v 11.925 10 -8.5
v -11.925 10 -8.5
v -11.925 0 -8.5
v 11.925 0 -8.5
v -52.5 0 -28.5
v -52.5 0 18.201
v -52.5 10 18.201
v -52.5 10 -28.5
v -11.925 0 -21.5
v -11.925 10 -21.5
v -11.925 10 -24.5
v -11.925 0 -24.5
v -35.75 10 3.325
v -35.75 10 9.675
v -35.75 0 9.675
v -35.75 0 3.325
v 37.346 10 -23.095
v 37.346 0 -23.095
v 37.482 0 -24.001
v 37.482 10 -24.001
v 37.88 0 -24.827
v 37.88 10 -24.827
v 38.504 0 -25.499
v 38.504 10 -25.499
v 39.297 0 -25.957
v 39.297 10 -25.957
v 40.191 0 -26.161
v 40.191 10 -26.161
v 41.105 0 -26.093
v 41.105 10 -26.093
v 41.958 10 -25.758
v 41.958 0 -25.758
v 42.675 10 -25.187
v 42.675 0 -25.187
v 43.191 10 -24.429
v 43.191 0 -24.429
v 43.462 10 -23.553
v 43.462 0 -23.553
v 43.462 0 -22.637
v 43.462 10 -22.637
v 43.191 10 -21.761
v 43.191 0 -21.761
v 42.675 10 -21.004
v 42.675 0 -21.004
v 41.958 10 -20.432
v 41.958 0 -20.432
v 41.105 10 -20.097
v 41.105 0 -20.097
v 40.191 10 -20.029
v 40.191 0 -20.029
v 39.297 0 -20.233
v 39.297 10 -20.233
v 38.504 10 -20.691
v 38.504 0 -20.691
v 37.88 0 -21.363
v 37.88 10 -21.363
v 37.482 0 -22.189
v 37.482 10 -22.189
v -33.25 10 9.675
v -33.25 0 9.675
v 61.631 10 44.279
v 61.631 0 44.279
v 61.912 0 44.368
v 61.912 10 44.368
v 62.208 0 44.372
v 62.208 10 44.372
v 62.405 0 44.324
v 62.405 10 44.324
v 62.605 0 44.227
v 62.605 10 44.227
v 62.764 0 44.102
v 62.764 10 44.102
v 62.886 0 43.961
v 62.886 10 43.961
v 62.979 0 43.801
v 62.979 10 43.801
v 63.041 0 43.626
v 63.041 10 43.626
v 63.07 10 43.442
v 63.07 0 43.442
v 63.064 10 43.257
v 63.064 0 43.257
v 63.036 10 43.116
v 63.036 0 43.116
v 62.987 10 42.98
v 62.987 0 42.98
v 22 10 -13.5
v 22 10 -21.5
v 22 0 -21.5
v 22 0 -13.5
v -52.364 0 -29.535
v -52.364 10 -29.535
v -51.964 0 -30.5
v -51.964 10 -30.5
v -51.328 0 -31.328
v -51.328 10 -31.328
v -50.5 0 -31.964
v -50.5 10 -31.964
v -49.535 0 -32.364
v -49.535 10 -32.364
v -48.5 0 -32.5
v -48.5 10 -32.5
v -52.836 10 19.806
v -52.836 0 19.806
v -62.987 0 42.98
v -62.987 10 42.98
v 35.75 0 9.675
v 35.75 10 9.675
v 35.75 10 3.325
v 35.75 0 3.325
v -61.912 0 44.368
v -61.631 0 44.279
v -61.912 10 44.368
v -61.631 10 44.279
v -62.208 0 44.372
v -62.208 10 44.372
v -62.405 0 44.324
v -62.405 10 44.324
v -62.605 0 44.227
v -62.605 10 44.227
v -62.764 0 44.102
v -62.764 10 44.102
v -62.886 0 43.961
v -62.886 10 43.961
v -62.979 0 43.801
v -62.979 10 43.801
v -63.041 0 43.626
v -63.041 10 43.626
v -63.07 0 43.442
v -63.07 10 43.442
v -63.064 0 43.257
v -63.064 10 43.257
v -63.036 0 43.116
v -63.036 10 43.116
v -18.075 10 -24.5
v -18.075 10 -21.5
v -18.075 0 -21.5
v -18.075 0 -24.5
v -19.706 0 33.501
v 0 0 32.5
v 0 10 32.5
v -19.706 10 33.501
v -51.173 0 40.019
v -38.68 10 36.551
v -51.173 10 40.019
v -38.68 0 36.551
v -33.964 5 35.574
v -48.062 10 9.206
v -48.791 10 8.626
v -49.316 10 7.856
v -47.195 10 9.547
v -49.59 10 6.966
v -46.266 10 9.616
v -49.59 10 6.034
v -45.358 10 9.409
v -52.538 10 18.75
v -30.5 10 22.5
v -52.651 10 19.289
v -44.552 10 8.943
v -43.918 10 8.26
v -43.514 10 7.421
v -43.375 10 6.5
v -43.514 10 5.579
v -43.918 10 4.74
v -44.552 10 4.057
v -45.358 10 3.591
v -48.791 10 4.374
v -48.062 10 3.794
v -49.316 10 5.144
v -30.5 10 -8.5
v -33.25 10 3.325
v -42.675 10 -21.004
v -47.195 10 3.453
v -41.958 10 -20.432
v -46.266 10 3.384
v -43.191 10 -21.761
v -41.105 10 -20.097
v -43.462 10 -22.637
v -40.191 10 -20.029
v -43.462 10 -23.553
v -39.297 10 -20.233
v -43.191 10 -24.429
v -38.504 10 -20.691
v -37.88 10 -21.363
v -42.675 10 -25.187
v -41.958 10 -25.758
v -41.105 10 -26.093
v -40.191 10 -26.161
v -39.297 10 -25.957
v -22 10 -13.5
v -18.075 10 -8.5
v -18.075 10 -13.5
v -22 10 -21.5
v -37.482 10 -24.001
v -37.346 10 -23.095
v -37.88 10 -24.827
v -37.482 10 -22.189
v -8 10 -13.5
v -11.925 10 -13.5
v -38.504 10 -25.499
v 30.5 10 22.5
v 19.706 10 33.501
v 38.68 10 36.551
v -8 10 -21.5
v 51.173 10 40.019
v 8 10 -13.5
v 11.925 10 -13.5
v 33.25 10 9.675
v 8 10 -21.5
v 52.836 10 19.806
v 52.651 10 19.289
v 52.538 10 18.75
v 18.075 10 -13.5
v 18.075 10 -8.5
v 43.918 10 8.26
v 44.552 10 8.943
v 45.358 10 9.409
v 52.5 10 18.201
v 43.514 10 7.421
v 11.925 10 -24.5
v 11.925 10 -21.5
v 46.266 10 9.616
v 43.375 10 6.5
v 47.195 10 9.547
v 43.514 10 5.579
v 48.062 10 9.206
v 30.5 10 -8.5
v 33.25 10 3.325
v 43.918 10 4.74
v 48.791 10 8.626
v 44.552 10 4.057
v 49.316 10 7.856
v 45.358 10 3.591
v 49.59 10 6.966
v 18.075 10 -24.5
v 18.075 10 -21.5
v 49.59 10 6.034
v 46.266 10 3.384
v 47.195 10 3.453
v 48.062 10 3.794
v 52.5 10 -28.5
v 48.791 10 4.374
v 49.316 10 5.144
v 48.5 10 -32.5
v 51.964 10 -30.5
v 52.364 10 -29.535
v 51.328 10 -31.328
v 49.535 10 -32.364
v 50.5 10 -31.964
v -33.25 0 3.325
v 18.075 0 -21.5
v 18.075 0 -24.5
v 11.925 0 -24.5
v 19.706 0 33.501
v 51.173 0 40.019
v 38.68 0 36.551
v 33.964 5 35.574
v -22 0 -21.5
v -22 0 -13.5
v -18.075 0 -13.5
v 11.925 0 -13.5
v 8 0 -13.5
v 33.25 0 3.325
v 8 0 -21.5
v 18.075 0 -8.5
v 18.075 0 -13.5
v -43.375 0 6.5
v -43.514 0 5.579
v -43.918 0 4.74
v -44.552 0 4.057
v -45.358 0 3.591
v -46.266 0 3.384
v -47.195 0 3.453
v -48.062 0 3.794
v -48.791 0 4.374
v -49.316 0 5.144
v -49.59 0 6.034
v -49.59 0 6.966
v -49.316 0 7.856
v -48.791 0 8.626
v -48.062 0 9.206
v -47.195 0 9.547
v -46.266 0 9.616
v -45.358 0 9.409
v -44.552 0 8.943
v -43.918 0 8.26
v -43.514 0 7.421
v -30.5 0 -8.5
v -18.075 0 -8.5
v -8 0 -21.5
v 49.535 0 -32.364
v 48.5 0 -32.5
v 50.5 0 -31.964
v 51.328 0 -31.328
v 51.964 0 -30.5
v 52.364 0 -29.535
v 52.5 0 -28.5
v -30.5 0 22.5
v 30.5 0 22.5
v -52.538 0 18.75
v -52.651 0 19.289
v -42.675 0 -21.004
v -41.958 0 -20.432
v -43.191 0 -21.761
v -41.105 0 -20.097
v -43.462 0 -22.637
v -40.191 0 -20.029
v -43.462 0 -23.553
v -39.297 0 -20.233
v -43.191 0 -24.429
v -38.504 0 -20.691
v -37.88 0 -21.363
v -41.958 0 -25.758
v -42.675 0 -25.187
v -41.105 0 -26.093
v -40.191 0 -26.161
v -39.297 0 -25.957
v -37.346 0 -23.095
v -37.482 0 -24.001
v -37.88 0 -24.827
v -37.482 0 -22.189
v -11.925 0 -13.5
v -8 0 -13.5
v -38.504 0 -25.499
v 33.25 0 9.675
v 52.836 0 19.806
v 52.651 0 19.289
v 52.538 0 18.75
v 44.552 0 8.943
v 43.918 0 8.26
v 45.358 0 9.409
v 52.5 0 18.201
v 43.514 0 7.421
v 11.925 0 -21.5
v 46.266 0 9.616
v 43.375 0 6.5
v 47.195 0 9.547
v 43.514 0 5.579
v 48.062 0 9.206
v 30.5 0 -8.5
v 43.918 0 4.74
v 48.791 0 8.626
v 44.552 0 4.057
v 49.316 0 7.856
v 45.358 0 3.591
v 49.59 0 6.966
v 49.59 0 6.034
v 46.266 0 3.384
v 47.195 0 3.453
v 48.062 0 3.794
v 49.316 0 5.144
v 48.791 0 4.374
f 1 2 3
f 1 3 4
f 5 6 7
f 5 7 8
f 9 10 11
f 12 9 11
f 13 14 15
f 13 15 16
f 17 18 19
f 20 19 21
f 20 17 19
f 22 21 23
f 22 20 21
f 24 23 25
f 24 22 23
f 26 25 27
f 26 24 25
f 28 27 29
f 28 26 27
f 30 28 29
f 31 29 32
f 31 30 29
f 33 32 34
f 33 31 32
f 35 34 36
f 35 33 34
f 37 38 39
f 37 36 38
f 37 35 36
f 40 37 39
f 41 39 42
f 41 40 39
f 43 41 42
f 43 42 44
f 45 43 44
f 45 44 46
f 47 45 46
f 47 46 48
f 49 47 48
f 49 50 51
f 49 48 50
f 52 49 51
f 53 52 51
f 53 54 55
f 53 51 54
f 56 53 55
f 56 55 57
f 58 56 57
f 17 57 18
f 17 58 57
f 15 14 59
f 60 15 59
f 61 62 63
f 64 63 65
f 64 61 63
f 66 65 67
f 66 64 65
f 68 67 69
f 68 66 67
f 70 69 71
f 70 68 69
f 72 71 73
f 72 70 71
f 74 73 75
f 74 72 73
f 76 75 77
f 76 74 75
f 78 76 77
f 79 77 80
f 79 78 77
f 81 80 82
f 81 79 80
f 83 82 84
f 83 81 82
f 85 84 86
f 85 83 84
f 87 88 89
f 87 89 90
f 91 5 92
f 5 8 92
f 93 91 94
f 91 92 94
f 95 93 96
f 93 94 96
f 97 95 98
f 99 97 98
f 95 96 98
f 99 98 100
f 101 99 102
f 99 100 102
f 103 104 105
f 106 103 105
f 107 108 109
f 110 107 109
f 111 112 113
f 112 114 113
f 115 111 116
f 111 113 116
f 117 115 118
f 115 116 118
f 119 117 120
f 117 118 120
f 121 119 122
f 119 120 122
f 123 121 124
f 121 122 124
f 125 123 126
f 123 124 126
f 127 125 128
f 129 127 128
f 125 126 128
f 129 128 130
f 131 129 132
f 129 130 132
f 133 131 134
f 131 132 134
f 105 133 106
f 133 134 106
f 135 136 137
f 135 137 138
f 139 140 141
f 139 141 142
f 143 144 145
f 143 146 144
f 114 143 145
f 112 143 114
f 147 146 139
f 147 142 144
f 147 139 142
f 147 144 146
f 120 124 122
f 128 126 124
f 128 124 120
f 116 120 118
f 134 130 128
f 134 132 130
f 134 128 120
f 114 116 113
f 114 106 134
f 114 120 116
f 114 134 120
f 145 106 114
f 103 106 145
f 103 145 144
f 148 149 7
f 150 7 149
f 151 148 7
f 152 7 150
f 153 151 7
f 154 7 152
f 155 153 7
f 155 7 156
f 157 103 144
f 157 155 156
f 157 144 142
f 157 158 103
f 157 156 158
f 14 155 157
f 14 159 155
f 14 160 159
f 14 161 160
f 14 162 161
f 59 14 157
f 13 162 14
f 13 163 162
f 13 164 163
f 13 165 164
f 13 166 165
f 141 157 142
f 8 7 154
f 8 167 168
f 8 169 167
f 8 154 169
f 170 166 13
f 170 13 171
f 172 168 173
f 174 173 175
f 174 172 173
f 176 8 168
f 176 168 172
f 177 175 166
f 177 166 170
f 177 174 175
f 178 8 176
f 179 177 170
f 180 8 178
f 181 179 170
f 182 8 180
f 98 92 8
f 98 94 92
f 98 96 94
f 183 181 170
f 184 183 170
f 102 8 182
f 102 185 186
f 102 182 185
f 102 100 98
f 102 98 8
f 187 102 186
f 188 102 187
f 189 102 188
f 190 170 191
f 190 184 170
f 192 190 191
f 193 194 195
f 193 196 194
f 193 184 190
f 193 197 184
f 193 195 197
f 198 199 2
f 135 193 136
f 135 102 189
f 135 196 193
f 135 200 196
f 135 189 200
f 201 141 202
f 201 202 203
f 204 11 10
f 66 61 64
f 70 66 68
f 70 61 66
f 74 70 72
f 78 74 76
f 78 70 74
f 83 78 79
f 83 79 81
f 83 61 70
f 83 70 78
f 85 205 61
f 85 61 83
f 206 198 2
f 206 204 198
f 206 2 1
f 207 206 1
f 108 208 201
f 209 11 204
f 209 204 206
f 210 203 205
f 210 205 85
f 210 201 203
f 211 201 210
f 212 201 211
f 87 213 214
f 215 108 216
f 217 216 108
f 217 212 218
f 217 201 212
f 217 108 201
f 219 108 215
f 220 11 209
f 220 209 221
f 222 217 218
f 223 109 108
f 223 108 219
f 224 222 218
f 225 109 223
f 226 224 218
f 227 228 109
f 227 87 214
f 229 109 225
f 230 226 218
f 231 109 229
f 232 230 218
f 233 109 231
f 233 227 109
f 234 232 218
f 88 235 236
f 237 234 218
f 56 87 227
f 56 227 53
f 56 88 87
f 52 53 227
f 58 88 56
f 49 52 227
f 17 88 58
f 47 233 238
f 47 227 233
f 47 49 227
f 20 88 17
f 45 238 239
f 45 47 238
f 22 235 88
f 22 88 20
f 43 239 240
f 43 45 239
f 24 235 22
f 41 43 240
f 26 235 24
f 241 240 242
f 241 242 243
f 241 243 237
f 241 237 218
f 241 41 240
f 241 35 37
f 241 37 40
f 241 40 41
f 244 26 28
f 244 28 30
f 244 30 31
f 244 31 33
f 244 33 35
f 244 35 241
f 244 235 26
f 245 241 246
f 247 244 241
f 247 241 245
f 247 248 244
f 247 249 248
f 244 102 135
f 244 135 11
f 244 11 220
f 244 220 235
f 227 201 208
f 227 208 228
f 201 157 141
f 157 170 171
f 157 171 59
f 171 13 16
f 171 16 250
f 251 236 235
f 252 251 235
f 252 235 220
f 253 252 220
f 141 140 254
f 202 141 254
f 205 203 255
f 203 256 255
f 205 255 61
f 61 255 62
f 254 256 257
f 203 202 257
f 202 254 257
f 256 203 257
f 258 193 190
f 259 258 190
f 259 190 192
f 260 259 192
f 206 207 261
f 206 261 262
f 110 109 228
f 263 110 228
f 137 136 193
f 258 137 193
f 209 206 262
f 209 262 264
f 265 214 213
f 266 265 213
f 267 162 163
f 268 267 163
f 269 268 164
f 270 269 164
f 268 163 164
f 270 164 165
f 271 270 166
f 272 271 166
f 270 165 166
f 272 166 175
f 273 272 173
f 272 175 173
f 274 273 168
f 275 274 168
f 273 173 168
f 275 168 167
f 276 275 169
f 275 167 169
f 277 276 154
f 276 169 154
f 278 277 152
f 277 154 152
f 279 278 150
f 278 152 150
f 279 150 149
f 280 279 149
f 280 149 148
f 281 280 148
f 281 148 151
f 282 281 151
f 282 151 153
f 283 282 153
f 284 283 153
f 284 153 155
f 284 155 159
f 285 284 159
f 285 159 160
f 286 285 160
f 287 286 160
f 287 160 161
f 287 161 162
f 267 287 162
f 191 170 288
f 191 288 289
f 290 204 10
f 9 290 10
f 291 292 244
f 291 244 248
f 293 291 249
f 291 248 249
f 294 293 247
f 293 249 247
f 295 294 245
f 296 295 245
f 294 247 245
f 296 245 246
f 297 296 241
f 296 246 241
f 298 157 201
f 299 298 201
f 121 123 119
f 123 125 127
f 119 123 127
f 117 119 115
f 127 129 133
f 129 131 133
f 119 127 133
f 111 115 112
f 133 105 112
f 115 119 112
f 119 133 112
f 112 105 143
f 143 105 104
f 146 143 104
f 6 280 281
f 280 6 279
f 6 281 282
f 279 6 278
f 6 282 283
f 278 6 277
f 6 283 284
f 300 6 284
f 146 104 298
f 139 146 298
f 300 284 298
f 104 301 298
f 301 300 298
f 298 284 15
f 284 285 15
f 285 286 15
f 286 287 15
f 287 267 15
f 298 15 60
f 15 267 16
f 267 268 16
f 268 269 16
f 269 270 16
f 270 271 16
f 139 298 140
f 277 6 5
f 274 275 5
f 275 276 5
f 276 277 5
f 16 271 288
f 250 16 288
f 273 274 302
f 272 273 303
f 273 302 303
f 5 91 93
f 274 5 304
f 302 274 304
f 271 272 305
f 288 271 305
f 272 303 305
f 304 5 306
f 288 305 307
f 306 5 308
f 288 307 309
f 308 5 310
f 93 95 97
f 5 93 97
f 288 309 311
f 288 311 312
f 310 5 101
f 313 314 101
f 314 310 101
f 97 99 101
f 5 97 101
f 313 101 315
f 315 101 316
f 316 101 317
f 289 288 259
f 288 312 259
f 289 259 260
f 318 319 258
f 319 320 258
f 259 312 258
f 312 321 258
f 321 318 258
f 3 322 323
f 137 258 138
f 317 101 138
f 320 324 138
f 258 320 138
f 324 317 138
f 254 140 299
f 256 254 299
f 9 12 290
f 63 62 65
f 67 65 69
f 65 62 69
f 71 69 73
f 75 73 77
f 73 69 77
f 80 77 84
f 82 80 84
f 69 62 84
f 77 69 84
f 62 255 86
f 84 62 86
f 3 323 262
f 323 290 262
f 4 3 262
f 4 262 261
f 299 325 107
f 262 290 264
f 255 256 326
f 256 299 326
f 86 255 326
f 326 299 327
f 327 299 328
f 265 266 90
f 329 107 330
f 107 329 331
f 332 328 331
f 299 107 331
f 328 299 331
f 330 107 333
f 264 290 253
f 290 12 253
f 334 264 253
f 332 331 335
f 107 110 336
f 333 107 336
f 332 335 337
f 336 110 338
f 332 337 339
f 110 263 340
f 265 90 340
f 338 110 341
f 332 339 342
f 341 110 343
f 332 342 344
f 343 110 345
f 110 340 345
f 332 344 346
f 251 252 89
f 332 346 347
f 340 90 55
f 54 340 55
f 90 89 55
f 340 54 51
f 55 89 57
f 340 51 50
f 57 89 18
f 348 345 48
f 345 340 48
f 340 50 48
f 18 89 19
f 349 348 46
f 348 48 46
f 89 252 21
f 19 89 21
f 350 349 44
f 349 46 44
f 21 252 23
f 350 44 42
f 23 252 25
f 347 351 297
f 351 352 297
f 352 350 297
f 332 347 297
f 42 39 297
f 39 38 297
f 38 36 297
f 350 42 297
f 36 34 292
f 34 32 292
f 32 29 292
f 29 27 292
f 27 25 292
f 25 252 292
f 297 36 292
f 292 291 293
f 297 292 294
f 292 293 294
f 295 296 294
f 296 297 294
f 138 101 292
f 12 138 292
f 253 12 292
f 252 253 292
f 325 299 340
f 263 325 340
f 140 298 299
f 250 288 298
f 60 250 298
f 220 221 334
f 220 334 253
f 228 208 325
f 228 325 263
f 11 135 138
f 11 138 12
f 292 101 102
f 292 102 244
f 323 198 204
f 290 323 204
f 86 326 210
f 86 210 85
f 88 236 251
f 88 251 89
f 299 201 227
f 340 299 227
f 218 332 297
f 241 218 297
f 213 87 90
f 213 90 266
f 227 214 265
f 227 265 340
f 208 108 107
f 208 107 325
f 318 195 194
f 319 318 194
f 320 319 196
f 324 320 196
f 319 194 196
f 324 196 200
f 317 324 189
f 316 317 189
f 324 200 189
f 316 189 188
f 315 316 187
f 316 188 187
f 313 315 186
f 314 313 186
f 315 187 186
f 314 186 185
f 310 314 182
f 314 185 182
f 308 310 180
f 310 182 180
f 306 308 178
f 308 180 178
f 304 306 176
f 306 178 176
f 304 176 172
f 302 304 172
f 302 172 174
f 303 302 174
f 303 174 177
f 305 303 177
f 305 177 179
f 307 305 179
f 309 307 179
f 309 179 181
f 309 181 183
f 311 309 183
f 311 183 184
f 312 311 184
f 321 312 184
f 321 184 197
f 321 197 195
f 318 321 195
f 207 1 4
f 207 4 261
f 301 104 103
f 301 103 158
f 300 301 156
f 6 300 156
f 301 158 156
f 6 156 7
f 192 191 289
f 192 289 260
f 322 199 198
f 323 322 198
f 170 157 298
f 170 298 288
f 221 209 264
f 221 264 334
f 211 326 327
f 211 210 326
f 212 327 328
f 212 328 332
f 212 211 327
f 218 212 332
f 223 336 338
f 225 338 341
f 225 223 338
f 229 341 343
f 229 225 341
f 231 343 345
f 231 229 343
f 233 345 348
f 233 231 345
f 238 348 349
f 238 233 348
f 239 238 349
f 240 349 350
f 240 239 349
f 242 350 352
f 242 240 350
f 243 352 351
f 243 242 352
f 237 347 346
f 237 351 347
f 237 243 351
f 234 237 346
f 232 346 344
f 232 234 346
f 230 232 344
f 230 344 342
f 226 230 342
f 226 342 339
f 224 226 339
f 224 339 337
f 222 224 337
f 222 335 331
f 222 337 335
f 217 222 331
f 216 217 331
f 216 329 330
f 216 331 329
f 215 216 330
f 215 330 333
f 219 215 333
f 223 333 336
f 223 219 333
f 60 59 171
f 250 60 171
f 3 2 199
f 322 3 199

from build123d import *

# Parameters (mm, degrees)
SKETCH1_W           = 105
SKETCH1_H           = 65
BOSS_EXTRUDE1_DEPTH = 10
SKETCH2_W           = 61
SKETCH2_H           = 31
CUT_EXTRUDE1_DEPTH  = 11
SKETCH3_W           = 6.15
SKETCH3_H           = 5
SKETCH3_H_2         = 3
CUT_EXTRUDE2_DEPTH  = 10
SKETCH4_R           = 3.125
SKETCH4_W           = 2.5
SKETCH4_H           = 6.35
CUT_EXTRUDE3_DEPTH  = 11
BOSS_EXTRUDE2_DEPTH = 10
SKETCH6_R           = 3.075
CUT_EXTRUDE4_DEPTH  = 11.0000001
FILLET2_R           = 1
FILLET1_R           = 4


with BuildPart() as part:
    # Sketch1 → Boss-Extrude1 (new body)
    with BuildSketch(Plane(origin=(0, 0, 0), x_dir=(1, 0, 0), z_dir=(0, 1, 0))):
        Rectangle(SKETCH1_W, SKETCH1_H)
    extrude(amount=BOSS_EXTRUDE1_DEPTH)

    # Sketch2 → Cut-Extrude1 (cut, through all)
    with BuildSketch(Plane(origin=(0, 10, 0), x_dir=(1, 0, 0), z_dir=(0, 1, 0))):
        with Locations((0, -7)):
            Rectangle(SKETCH2_W, SKETCH2_H)
    extrude(amount=-CUT_EXTRUDE1_DEPTH, mode=Mode.SUBTRACT)

    # Sketch3 → Cut-Extrude2 (cut)
    with BuildSketch(Plane(origin=(0, 10, 0), x_dir=(1, 0, 0), z_dir=(0, 1, 0))):
        with Locations((-15, 11)):
            Rectangle(SKETCH3_W, SKETCH3_H)
        Polygon((-18.075, 21.5), (-22, 21.5), (-22, 13.5), (-18.075, 13.5), (-11.925, 13.5), (-8, 13.5), (-8, 21.5), (-11.925, 21.5), (-11.925, 18.5), (-18.075, 18.5), align=None)
        with Locations((-15, 20)):
            Rectangle(SKETCH3_W, SKETCH3_H_2)
        with Locations((-15, 23)):
            Rectangle(SKETCH3_W, SKETCH3_H_2)
    cut_extrude2 = extrude(amount=-CUT_EXTRUDE2_DEPTH, mode=Mode.SUBTRACT)

    # Sketch4 → Cut-Extrude3 (cut, through all)
    with BuildSketch(Plane(origin=(0, 10, 0), x_dir=(1, 0, 0), z_dir=(0, 1, 0))):
        with Locations((-46.5, -6.5)):
            Circle(SKETCH4_R)
        with Locations((-34.5, -6.5)):
            Rectangle(SKETCH4_W, SKETCH4_H)
    cut_extrude3 = extrude(amount=-CUT_EXTRUDE3_DEPTH, mode=Mode.SUBTRACT)

    # Sketch5 → Boss-Extrude2 (add)
    with BuildSketch(Plane(origin=(0, 0, 0), x_dir=(1, 0, 0), z_dir=(0, 1, 0))):
        with BuildLine():
            Line((0, -32.5), (-52.5, -19.039128985))
            Line((-52.5, -19.039128985), (-64.119998298, -45.565168911))
            add(Edge.make_bspline(
                [(0, -32.5), (-40.125285882, -32.5), (-64.119998298, -45.565168911)],
                knots=[4.71238898, 4.71238898, 4.71238898, 5.642188346, 5.642188346, 5.642188346], degree=2, weights=[1, 0.893866546, 1]))
        make_face()
    boss_extrude2 = extrude(amount=BOSS_EXTRUDE2_DEPTH)

    # Sketch6 → Cut-Extrude4 (cut, through all)
    with BuildSketch(Plane(origin=(0, 10, 0), x_dir=(1, 0, 0), z_dir=(0, 1, 0))):
        with Locations((-40.420875644, 23.095045258)):
            Circle(SKETCH6_R)
    cut_extrude4 = extrude(amount=-CUT_EXTRUDE4_DEPTH, mode=Mode.SUBTRACT)

    # Mirror1: Cut-Extrude2, Cut-Extrude3, Boss-Extrude2, Cut-Extrude4 across plane
    add(cut_extrude2.mirror(Plane(origin=(0, 0, 0), x_dir=(0, 0, 1), z_dir=(1, 0, 0))), mode=Mode.SUBTRACT)
    add(cut_extrude3.mirror(Plane(origin=(0, 0, 0), x_dir=(0, 0, 1), z_dir=(1, 0, 0))), mode=Mode.SUBTRACT)
    add(boss_extrude2.mirror(Plane(origin=(0, 0, 0), x_dir=(0, 0, 1), z_dir=(1, 0, 0))))
    add(cut_extrude4.mirror(Plane(origin=(0, 0, 0), x_dir=(0, 0, 1), z_dir=(1, 0, 0))), mode=Mode.SUBTRACT)

    # Fillet2
    fillet2_edges = [part.edges().sort_by_distance(p)[0] for p in [
        (-64.119998298, 5, 45.565168911),
        (64.119998298, 5, 45.565168911),
    ]]
    fillet(fillet2_edges, radius=FILLET2_R)

    # Fillet1
    fillet1_edges = [part.edges().sort_by_distance(p)[0] for p in [
        (52.5, 5, 19.039128985),
        (-52.5, 5, -32.5),
        (52.5, 5, -32.5),
        (-52.5, 5, 19.039128985),
    ]]
    fillet(fillet1_edges, radius=FILLET1_R)


solid = part.part
